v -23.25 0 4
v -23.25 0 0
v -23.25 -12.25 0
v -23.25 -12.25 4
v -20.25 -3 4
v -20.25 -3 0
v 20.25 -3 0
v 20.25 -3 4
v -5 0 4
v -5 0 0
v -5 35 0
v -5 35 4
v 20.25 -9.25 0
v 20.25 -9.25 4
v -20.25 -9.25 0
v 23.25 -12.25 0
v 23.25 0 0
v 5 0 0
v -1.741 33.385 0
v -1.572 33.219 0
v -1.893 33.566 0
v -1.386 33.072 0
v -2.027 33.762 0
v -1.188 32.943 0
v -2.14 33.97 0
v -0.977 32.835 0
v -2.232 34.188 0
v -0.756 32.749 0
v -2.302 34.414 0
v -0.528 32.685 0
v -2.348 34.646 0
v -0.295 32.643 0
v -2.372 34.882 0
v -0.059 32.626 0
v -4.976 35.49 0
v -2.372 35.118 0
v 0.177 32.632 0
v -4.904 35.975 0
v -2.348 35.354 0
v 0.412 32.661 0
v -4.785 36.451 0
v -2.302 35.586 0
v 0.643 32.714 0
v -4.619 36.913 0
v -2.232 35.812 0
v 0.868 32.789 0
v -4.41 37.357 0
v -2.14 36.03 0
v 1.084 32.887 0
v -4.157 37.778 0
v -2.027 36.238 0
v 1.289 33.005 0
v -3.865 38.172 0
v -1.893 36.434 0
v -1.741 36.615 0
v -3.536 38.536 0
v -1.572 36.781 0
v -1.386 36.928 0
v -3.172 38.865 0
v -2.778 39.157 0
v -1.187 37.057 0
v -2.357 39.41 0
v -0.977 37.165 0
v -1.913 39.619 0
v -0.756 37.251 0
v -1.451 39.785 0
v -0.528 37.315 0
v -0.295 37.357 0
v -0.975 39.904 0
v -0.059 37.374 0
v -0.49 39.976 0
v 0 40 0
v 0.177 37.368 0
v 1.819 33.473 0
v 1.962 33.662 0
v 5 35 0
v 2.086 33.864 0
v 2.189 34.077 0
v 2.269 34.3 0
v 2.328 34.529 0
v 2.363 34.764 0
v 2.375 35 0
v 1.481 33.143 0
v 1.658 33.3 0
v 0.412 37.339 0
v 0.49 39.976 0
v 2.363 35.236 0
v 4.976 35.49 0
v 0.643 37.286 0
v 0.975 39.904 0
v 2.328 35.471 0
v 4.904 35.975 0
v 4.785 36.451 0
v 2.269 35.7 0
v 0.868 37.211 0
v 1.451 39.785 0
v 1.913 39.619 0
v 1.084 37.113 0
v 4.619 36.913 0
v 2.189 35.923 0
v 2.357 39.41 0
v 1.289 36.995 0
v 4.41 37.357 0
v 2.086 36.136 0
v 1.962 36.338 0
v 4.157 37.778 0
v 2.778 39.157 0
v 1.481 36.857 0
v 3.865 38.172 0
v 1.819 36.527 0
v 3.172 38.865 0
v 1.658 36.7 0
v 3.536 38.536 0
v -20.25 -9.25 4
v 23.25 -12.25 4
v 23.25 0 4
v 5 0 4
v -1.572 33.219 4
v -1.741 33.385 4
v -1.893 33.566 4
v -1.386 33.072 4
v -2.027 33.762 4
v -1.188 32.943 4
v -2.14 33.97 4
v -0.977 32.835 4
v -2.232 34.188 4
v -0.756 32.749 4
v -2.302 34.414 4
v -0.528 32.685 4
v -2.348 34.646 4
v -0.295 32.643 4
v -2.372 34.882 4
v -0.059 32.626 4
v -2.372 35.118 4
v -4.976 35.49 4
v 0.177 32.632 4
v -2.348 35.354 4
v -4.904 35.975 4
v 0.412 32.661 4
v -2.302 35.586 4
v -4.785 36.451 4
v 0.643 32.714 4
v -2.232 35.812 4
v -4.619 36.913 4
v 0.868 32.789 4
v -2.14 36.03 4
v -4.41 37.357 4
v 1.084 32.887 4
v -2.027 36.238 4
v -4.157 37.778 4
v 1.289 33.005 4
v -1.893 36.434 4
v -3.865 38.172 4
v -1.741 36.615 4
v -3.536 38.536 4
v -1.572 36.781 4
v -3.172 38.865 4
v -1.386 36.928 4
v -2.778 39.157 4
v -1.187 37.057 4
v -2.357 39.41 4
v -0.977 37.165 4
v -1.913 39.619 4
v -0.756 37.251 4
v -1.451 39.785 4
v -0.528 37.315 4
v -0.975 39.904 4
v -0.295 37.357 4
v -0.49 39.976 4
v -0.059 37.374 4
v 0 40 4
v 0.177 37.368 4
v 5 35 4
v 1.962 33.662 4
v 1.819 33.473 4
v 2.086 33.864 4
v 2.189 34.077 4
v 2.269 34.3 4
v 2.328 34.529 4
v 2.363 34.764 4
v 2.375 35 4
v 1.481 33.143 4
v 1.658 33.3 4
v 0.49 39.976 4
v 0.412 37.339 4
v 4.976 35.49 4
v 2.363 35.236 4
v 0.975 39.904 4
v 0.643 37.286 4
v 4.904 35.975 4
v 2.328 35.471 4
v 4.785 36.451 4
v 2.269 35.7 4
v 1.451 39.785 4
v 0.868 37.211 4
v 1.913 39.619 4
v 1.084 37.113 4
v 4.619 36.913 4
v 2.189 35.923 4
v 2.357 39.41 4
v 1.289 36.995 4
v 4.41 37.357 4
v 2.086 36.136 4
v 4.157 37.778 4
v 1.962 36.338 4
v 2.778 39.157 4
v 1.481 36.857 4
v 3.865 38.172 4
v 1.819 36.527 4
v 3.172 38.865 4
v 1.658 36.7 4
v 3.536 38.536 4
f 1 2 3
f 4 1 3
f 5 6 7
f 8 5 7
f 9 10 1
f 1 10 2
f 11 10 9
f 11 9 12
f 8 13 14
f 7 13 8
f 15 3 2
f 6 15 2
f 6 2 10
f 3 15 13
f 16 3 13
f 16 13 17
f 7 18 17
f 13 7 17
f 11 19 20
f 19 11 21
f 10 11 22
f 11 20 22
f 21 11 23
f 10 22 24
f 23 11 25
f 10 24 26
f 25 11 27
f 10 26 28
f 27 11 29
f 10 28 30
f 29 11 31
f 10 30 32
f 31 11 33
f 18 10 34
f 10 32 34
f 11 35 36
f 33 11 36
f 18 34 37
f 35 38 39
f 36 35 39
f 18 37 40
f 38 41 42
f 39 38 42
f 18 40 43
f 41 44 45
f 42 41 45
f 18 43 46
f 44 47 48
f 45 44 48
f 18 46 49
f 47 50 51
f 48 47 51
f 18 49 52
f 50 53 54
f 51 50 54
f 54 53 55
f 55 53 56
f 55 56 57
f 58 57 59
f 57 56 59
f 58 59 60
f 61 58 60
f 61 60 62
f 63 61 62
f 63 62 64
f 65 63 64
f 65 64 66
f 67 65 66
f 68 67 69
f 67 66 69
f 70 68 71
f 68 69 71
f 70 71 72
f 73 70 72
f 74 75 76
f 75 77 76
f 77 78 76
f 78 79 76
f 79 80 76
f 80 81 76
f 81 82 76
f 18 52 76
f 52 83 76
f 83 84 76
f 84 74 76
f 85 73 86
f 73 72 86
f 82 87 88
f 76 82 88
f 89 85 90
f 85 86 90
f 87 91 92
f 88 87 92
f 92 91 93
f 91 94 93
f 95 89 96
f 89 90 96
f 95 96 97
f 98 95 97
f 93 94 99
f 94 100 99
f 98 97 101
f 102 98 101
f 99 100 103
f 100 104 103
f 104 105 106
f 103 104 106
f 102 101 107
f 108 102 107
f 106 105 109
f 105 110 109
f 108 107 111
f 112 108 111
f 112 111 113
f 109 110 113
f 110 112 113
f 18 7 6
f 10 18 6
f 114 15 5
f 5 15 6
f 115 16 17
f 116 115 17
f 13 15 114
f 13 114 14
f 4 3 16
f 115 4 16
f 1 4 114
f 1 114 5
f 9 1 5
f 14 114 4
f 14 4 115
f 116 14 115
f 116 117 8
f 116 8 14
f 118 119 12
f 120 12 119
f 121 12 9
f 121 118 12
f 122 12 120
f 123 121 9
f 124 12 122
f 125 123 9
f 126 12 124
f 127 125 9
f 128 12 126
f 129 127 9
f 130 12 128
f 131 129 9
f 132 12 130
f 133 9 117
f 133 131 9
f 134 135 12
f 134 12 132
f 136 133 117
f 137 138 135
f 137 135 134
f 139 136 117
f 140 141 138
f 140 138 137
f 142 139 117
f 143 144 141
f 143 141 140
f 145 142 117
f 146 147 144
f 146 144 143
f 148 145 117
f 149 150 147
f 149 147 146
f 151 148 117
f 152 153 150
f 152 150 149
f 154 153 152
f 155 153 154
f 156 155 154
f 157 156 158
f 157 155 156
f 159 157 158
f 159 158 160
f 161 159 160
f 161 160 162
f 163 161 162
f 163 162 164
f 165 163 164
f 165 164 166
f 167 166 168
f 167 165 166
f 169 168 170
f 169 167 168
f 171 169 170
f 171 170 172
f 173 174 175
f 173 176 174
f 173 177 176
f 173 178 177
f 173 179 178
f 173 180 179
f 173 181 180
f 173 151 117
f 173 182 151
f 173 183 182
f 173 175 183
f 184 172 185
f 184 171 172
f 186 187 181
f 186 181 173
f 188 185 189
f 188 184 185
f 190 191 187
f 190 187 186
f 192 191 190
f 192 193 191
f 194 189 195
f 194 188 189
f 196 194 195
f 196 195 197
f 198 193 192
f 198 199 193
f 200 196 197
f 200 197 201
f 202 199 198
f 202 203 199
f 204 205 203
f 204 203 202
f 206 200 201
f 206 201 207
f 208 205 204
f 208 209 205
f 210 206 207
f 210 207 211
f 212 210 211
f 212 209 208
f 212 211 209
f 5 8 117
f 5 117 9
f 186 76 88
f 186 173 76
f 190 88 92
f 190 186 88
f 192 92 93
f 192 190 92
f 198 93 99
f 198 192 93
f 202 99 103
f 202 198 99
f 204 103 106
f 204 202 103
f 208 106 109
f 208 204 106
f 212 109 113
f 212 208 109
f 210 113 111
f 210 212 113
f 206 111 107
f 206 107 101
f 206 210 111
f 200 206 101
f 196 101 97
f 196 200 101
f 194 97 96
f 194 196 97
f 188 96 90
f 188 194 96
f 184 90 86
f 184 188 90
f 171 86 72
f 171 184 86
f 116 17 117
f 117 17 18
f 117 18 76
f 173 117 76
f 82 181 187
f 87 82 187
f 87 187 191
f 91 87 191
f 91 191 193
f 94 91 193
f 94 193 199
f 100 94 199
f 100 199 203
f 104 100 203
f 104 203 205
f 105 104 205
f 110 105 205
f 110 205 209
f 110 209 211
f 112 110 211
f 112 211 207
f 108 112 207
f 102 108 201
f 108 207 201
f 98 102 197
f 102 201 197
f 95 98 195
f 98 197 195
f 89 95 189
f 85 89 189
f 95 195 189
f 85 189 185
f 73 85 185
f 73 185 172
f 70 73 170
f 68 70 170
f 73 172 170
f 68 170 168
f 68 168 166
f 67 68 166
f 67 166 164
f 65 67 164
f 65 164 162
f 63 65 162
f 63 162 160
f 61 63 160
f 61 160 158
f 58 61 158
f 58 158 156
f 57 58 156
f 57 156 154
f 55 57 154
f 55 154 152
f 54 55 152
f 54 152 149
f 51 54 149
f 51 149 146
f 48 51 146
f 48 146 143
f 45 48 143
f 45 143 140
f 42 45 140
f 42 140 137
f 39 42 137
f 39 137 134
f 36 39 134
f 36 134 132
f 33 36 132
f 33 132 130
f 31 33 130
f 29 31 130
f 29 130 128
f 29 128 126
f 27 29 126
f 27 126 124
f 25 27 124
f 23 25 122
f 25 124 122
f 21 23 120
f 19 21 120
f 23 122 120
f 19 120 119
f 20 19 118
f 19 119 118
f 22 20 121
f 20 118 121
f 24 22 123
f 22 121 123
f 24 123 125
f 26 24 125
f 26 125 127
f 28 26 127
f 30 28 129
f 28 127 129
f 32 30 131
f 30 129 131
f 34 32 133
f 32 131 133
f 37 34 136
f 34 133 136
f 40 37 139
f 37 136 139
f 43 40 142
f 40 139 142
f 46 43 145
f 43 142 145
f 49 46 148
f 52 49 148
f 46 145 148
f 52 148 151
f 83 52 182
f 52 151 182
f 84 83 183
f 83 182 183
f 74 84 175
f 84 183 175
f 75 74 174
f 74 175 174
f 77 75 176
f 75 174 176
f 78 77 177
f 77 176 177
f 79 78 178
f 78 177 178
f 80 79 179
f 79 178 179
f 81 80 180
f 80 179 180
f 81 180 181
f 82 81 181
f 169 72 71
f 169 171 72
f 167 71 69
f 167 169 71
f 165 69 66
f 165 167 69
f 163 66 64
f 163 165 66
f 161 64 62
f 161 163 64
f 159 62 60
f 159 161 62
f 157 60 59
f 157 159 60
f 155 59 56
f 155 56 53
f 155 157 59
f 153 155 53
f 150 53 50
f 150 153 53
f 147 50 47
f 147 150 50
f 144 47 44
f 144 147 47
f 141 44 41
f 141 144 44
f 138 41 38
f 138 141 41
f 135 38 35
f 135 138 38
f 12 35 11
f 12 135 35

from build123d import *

# Parameters (mm, degrees)
F0_W     = 3
F0_H     = 3
F0_W_2   = 40.5
F0_H_2   = 6.25
F0_W_3   = 10
F0_H_3   = 40
F1_DEPTH = 4
F2_R     = 4.99999
F3_R     = 2.375
F4_DEPTH = 4.001


# Not quite as in the source:
# - a fillet or chamfer is up to 0.001 mm smaller than in the source, because OpenCascade refuses the exact size


with BuildPart() as f1:
    # F0 (on Top) → F1 (new body)
    with BuildSketch(Plane.XY):
        with Locations((21.75, -1.5)):
            Rectangle(F0_W, F0_H)
        Polygon((20.25, -3), (20.25, 0), (5, 0), (-5, 0), (-23.25, 0), (-23.25, -12.25), (23.25, -12.25), (23.25, -3), align=None)
        with Locations((0, -6.125)):
            Rectangle(F0_W_2, F0_H_2, mode=Mode.SUBTRACT)
        with Locations((0, 20)):
            Rectangle(F0_W_3, F0_H_3)
    extrude(amount=F1_DEPTH)

    # F2 (radius 5 in the source; OpenCascade refuses exactly that, so slightly less here)
    f2_edges = [f1.edges().sort_by_distance(p)[0] for p in [
        (5, 40, 2),
        (-5, 40, 2),
    ]]
    fillet(f2_edges, radius=F2_R)

    # F3 (on face) → F4 (cut, through all)
    with BuildSketch(Plane.XY.offset(4)):
        with Locations((0, 35)):
            Circle(F3_R)
    extrude(amount=-F4_DEPTH, mode=Mode.SUBTRACT)


solid = f1.part
